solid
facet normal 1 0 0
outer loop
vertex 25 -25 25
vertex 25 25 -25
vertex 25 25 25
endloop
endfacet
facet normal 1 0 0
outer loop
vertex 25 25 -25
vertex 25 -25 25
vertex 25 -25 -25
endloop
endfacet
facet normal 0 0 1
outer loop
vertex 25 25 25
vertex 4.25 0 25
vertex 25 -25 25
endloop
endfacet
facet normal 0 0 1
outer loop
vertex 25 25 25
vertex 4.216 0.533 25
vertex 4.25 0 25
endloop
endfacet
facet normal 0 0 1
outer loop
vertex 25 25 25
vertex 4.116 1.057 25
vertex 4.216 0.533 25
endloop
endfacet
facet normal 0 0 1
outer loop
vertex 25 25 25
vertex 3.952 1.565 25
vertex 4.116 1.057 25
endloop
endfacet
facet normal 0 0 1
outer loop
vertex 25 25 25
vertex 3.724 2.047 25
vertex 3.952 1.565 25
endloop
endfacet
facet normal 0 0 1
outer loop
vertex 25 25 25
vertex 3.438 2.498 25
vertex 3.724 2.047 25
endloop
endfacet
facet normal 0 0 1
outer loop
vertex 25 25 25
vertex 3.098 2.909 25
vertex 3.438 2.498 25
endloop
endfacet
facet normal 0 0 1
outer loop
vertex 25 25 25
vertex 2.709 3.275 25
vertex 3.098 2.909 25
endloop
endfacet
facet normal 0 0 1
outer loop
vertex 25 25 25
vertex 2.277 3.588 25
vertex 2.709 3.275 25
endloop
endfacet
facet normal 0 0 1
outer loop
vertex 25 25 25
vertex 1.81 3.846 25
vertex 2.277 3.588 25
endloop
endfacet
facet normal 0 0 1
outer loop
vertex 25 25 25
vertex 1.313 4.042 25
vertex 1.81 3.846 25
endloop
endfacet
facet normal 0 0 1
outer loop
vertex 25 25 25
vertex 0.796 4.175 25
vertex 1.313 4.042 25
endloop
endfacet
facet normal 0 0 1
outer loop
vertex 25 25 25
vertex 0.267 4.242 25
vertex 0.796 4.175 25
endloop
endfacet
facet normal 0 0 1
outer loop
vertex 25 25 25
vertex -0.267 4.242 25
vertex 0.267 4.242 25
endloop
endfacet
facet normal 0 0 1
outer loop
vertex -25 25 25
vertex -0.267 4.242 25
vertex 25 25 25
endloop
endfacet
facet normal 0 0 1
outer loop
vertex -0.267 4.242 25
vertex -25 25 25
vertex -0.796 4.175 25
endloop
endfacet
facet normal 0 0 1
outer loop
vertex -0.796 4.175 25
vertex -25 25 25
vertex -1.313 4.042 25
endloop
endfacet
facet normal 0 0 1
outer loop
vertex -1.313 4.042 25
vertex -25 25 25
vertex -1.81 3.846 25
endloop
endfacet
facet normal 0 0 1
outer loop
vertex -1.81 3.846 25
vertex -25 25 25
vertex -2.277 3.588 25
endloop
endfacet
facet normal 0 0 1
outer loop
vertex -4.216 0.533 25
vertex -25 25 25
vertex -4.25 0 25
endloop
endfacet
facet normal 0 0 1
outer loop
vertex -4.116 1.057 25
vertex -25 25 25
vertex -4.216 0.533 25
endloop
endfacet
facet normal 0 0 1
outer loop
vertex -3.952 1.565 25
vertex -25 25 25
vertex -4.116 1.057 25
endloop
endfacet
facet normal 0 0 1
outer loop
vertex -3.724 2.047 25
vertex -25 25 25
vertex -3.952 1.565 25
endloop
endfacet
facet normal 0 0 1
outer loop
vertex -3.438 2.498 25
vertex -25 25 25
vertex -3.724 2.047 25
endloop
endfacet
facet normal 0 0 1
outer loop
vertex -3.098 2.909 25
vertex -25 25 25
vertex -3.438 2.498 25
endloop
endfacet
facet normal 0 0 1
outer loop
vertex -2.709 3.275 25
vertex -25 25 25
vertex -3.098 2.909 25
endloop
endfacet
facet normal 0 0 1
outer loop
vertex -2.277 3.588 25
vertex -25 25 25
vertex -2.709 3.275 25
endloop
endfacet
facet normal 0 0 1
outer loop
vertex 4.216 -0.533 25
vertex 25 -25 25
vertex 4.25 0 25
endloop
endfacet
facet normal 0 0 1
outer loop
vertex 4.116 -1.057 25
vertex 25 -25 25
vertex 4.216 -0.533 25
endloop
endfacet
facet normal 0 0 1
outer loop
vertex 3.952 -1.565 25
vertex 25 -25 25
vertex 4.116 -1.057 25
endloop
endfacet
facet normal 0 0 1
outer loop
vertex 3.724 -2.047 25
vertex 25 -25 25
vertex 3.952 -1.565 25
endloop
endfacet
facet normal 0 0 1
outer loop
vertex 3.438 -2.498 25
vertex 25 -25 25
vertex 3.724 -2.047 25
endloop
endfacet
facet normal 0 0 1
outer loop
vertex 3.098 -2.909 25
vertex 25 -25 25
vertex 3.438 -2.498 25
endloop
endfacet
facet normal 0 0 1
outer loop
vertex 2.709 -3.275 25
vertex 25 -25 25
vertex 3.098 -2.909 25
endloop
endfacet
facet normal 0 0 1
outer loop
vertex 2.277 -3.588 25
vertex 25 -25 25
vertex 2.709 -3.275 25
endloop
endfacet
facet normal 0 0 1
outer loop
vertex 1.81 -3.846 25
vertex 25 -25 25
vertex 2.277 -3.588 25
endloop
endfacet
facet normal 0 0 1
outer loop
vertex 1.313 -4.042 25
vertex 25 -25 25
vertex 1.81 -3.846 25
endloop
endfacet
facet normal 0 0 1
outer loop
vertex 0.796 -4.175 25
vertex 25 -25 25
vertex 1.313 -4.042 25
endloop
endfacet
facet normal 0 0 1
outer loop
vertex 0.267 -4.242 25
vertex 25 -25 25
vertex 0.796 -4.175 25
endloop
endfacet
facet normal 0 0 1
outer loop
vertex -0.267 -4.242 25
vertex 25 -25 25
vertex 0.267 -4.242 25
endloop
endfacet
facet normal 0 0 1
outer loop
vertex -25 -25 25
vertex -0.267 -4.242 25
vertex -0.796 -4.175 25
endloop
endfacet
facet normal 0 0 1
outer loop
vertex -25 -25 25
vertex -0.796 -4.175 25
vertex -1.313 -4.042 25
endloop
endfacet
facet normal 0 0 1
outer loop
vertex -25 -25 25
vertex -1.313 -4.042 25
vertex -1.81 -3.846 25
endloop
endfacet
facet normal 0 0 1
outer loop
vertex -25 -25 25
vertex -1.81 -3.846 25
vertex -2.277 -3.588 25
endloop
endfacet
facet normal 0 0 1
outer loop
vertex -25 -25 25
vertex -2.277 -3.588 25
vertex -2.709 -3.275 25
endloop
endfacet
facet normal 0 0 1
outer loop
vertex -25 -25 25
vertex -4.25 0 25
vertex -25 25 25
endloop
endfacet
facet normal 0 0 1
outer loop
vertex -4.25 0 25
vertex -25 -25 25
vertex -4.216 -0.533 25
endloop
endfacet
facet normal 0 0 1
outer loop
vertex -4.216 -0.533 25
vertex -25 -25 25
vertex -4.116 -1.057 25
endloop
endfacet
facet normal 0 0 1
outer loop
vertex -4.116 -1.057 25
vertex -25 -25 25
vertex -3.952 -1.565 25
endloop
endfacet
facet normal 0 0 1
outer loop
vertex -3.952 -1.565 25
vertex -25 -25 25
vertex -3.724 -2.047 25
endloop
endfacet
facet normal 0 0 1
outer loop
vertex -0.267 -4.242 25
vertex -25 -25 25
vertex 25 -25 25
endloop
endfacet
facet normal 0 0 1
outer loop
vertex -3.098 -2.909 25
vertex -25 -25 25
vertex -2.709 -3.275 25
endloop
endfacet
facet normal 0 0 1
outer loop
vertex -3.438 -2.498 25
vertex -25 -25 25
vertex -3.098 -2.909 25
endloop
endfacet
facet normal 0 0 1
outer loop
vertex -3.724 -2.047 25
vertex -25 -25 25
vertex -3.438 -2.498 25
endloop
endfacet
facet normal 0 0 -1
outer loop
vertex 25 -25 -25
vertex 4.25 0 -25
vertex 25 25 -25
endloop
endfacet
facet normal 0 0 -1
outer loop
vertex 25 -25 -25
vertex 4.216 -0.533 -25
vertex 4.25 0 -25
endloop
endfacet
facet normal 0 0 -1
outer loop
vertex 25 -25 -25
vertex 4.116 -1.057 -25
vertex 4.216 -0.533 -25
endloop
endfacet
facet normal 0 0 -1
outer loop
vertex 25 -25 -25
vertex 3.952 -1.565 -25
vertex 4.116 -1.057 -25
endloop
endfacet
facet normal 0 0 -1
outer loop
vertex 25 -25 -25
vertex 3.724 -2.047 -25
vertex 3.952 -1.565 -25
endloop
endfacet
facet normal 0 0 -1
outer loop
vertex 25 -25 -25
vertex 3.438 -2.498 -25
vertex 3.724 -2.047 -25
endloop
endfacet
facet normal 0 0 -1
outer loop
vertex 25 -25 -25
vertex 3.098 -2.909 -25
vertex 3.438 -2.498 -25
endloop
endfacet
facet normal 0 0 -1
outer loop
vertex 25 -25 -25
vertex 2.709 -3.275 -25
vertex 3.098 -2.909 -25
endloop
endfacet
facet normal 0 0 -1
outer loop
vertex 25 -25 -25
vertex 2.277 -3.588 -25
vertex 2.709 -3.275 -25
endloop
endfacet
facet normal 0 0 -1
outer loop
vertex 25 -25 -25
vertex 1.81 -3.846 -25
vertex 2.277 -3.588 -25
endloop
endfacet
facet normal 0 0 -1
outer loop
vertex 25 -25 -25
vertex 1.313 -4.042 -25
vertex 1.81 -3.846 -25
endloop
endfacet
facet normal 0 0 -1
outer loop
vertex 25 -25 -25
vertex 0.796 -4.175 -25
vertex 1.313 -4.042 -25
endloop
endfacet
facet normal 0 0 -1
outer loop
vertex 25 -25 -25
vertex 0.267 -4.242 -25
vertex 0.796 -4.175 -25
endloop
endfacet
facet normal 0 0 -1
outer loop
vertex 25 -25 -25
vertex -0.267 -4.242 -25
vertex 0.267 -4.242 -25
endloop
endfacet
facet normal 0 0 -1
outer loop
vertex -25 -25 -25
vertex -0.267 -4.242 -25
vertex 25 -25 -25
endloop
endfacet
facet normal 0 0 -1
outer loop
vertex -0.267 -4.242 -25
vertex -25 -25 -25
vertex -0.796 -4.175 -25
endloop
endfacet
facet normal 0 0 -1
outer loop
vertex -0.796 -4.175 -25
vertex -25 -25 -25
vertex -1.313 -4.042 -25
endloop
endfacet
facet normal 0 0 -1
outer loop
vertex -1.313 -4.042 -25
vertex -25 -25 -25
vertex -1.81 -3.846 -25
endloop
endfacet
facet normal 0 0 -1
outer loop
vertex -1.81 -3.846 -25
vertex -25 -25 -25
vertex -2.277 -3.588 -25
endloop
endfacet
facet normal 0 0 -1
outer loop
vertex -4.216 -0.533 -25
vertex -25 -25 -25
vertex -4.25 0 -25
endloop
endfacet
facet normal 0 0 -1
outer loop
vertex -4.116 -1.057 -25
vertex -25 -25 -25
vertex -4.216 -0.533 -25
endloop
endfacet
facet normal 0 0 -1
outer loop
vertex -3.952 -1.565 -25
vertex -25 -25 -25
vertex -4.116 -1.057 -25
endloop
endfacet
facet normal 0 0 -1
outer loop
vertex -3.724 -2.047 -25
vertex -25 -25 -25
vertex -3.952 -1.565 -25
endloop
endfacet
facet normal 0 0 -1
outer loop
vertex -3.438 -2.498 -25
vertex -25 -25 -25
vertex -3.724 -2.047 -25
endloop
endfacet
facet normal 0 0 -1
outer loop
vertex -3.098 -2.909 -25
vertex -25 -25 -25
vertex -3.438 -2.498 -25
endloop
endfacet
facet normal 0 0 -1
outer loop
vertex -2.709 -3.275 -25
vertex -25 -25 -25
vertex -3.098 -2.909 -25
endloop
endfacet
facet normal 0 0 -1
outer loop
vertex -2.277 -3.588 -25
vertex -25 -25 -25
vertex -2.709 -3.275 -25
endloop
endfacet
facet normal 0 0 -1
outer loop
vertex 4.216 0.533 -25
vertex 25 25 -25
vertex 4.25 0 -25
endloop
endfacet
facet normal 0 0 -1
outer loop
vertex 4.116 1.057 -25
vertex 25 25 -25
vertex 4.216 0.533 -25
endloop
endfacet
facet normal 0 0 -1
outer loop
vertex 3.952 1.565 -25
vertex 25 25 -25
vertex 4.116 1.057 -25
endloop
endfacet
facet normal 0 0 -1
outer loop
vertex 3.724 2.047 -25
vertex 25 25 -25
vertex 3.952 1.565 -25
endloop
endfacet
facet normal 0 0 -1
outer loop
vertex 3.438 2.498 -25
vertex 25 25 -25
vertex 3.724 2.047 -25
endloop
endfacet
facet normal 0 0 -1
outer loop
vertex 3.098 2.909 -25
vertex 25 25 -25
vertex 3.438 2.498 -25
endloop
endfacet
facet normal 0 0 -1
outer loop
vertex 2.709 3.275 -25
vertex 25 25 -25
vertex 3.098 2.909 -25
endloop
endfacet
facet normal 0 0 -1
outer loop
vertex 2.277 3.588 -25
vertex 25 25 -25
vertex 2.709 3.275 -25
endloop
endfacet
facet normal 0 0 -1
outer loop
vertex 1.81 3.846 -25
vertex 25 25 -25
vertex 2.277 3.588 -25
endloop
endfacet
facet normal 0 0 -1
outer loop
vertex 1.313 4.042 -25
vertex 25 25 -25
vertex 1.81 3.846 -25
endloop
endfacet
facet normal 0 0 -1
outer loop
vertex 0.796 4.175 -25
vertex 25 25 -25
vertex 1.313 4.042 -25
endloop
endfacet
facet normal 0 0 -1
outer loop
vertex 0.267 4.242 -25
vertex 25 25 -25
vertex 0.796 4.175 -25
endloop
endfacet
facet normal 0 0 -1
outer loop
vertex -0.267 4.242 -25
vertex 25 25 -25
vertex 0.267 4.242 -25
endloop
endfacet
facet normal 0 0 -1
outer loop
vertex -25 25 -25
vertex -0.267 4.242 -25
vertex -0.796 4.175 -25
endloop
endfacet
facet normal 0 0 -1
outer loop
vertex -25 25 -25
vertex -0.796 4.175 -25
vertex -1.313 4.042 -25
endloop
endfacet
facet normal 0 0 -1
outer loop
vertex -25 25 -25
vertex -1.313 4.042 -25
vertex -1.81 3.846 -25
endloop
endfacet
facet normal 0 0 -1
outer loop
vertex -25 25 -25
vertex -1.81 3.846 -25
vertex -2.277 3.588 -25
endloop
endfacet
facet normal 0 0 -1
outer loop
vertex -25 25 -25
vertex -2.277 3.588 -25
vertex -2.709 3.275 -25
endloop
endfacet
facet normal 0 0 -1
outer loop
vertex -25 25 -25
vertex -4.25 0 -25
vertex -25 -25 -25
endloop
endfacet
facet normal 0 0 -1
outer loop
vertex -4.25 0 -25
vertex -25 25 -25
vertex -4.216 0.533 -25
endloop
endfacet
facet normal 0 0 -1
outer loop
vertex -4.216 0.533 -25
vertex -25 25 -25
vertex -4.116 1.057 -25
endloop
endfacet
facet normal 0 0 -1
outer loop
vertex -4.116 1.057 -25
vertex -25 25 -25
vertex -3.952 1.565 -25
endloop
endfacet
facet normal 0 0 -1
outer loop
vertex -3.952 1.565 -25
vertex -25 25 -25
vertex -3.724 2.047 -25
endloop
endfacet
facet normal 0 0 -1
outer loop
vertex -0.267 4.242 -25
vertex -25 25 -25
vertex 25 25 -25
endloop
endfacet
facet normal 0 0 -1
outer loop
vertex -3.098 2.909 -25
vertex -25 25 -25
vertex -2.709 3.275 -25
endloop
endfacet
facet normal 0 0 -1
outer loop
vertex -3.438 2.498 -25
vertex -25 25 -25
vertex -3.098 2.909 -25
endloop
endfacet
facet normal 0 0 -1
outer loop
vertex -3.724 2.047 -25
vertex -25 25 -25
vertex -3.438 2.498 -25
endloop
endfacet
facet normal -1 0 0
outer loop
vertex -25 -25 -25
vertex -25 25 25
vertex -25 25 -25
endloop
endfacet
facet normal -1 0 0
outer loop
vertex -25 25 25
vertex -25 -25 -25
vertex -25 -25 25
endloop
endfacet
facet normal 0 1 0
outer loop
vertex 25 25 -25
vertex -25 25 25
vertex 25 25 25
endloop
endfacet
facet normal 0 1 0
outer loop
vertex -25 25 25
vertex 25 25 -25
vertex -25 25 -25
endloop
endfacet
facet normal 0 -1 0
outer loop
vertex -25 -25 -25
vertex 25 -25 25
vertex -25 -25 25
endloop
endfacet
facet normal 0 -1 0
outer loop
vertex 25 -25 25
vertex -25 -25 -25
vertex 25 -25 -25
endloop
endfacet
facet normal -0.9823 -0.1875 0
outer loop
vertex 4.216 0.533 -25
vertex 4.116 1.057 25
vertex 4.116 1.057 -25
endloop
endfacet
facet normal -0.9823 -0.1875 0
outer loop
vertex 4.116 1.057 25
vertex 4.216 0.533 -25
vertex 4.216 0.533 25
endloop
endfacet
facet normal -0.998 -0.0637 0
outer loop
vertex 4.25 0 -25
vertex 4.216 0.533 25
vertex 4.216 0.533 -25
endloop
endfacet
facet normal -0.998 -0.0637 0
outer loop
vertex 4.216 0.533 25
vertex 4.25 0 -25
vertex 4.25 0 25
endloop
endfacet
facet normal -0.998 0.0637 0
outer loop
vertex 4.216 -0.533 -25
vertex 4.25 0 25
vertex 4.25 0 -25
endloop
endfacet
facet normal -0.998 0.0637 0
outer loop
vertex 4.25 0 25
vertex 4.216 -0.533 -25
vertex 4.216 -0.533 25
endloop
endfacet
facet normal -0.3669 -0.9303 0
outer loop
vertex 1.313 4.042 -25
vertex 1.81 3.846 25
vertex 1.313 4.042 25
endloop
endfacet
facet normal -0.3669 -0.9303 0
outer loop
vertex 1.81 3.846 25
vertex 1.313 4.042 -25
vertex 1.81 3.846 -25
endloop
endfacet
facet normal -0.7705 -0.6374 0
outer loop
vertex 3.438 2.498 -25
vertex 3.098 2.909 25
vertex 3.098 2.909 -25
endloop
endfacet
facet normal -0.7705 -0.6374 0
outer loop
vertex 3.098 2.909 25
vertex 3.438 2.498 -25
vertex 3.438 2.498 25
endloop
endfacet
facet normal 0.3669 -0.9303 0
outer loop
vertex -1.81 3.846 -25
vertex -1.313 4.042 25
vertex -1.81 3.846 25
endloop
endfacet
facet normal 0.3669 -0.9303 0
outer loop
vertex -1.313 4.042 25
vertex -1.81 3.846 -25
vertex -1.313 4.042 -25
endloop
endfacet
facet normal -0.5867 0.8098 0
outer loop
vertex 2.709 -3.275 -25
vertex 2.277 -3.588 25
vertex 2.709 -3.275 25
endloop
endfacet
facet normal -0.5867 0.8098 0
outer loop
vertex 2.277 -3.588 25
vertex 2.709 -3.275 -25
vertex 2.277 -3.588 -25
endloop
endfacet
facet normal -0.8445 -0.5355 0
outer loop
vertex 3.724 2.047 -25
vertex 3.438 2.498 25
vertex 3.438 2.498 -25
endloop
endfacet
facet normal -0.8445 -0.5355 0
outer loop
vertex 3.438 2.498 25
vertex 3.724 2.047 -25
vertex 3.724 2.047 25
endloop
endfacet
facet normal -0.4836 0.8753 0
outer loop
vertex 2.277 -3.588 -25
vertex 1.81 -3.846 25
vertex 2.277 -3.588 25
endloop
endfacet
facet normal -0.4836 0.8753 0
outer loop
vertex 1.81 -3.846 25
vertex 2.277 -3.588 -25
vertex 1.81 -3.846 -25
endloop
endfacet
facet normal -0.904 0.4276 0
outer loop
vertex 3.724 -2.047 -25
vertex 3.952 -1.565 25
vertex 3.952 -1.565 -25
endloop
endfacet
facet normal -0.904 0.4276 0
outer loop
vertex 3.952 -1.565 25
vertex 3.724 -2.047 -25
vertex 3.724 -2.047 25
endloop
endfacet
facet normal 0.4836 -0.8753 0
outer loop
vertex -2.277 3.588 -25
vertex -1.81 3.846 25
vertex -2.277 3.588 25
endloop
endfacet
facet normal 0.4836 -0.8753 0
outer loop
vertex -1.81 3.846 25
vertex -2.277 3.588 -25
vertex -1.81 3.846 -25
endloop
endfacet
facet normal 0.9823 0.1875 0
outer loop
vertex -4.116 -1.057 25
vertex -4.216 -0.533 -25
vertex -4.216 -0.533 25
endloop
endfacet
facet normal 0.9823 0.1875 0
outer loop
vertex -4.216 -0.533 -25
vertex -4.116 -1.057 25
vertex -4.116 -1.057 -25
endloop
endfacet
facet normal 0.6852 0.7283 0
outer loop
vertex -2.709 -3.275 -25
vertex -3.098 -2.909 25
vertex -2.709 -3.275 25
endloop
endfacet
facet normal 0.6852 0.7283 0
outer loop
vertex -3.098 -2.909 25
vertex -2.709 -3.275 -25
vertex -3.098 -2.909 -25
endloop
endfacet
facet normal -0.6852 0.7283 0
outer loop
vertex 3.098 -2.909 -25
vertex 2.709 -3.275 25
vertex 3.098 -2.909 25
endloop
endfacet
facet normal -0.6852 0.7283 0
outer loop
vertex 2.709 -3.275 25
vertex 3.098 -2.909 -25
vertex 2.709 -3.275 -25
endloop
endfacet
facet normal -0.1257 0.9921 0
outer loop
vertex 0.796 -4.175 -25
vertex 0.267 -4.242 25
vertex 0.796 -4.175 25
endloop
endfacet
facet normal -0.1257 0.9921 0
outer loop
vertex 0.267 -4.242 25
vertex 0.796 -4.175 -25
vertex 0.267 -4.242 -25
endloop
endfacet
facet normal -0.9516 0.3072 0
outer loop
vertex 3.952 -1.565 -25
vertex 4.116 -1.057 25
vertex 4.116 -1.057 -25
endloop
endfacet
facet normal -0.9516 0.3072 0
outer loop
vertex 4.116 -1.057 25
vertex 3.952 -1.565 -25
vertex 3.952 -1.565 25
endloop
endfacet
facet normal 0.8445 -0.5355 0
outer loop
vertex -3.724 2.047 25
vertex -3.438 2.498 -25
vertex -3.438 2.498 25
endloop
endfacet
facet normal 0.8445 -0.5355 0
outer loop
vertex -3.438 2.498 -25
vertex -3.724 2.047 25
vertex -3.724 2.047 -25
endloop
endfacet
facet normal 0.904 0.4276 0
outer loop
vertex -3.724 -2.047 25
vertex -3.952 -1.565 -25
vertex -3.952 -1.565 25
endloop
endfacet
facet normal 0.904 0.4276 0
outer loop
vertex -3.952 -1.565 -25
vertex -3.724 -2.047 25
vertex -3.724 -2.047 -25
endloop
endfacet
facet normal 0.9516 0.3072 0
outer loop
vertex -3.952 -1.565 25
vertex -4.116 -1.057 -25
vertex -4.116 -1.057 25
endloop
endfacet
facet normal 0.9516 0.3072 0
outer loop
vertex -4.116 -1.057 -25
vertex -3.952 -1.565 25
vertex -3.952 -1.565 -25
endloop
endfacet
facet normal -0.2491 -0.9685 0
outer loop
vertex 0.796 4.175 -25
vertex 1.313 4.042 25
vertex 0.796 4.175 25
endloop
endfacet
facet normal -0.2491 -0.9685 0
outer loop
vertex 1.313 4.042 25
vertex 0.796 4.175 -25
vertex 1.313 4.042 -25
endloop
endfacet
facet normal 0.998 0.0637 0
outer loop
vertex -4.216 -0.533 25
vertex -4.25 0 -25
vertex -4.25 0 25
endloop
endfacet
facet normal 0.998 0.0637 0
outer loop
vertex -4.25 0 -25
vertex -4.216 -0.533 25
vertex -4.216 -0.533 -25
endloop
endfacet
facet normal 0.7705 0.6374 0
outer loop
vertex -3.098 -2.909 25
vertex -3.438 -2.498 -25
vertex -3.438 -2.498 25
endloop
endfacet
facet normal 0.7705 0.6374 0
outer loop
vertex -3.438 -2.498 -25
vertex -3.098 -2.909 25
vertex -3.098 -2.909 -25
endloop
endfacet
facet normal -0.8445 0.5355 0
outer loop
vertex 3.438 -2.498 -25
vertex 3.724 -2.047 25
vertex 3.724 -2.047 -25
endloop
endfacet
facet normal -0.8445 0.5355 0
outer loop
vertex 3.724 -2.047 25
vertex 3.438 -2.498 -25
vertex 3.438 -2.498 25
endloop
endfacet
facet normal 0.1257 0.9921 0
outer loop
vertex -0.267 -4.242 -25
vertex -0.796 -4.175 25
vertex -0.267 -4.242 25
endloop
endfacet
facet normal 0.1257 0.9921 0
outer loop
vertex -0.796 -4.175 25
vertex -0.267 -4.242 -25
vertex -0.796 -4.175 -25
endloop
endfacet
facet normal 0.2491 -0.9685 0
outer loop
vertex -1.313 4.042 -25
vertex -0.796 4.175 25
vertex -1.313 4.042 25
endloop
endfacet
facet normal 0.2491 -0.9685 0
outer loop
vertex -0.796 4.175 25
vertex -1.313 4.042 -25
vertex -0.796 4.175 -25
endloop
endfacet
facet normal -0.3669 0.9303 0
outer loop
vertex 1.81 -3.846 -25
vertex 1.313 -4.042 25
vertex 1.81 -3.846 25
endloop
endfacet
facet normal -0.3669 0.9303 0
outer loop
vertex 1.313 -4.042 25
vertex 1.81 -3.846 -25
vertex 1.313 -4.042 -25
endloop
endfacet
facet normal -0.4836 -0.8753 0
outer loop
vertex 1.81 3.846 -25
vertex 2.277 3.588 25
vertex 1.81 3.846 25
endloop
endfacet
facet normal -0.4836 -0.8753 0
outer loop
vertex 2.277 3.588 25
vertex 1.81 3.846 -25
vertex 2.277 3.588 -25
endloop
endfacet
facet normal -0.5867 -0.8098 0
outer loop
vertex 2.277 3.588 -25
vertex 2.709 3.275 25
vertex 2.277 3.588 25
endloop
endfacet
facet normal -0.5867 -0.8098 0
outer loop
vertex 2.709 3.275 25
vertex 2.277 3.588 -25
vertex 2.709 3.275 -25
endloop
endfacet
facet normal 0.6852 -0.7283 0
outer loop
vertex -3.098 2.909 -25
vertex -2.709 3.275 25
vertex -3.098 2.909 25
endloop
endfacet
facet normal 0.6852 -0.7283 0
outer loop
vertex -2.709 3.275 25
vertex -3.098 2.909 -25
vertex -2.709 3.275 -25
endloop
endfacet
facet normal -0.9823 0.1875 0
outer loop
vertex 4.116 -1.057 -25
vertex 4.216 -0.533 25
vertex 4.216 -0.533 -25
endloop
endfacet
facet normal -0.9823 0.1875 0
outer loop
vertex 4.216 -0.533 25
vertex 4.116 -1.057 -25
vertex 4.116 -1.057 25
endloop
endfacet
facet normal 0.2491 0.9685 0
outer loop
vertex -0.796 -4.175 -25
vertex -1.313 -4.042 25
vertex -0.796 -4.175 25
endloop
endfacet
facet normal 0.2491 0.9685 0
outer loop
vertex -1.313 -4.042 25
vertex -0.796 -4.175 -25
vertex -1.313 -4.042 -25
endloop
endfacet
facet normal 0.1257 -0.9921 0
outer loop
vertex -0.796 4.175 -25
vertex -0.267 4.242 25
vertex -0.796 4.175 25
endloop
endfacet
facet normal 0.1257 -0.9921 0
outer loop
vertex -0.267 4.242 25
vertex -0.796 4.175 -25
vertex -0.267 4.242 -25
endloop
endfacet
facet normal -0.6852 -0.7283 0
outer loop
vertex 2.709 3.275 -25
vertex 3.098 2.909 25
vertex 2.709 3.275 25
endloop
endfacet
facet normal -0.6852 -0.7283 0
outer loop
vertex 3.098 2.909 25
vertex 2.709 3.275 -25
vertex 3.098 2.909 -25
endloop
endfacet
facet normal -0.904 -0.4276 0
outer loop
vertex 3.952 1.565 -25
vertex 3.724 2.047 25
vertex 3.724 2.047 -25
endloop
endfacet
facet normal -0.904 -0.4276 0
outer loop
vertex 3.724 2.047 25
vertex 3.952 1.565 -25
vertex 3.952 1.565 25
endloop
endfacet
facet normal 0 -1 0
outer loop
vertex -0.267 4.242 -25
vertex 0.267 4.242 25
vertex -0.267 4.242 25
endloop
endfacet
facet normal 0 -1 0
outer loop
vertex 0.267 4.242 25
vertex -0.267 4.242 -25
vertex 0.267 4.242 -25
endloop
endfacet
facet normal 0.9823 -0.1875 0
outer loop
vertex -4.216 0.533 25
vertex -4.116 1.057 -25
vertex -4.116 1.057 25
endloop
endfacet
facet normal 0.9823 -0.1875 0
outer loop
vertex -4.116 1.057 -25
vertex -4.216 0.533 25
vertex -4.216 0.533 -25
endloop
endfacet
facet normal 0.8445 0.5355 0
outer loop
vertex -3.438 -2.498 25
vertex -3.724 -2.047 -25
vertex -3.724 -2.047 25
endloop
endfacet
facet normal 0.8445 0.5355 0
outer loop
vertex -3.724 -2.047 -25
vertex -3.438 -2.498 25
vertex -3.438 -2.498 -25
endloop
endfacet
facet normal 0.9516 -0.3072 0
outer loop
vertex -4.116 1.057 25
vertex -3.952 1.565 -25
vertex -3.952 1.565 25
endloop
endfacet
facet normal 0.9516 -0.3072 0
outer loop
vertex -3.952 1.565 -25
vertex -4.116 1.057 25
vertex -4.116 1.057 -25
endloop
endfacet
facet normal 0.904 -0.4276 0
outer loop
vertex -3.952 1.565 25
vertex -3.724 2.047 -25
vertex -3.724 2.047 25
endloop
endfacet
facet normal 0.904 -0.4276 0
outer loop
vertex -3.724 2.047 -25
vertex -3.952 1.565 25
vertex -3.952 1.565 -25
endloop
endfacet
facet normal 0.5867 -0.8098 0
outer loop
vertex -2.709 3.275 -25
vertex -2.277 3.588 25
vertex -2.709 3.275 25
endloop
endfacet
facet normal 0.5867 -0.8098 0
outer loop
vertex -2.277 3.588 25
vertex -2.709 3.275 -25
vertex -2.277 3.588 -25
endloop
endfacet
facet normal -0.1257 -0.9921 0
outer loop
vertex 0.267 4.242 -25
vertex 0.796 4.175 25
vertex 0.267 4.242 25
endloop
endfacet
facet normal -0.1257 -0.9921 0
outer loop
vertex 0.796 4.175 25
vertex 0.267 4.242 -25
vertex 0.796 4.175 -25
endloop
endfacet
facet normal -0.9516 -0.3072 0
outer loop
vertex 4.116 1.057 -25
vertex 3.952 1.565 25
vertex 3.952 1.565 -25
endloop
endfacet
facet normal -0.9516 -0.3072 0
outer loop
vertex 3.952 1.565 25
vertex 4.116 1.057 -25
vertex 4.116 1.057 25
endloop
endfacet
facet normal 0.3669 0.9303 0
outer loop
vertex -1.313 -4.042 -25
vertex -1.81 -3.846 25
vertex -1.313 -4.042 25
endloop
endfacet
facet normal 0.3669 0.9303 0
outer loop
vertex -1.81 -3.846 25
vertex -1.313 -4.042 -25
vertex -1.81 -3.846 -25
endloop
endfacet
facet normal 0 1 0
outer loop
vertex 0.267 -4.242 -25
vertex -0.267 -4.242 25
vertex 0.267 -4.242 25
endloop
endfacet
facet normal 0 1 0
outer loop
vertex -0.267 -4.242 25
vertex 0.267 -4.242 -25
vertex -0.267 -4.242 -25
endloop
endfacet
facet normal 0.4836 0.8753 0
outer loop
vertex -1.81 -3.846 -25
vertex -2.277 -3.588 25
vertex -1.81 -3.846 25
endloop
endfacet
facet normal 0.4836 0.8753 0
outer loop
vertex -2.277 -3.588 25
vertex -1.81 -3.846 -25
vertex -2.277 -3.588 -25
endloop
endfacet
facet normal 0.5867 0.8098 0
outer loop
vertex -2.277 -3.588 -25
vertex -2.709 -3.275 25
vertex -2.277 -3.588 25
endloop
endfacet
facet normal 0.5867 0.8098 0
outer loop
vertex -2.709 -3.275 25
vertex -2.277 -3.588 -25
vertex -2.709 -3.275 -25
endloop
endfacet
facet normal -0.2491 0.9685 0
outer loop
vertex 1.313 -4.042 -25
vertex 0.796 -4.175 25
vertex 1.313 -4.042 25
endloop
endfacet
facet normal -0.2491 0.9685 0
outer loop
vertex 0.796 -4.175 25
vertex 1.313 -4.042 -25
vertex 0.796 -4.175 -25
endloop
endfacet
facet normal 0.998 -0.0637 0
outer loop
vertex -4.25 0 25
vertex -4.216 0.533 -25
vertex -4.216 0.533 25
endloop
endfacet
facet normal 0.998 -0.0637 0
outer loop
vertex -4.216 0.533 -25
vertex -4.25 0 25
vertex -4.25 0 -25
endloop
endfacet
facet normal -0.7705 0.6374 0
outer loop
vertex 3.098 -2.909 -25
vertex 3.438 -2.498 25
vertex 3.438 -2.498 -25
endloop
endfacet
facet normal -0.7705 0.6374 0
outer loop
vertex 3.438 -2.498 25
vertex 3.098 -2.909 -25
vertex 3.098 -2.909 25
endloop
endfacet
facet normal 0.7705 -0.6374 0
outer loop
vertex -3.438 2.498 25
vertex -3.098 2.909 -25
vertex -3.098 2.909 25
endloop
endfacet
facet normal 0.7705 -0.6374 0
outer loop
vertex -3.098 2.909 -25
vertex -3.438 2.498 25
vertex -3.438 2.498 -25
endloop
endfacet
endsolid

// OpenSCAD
$fn=50;

pulley_size=50;
axis_dia=8;
offset_a = 0.5;



difference()
{
    cube([pulley_size,pulley_size,pulley_size],true);
    cylinder(pulley_size*2,d=axis_dia+offset_a, center = true);
}
